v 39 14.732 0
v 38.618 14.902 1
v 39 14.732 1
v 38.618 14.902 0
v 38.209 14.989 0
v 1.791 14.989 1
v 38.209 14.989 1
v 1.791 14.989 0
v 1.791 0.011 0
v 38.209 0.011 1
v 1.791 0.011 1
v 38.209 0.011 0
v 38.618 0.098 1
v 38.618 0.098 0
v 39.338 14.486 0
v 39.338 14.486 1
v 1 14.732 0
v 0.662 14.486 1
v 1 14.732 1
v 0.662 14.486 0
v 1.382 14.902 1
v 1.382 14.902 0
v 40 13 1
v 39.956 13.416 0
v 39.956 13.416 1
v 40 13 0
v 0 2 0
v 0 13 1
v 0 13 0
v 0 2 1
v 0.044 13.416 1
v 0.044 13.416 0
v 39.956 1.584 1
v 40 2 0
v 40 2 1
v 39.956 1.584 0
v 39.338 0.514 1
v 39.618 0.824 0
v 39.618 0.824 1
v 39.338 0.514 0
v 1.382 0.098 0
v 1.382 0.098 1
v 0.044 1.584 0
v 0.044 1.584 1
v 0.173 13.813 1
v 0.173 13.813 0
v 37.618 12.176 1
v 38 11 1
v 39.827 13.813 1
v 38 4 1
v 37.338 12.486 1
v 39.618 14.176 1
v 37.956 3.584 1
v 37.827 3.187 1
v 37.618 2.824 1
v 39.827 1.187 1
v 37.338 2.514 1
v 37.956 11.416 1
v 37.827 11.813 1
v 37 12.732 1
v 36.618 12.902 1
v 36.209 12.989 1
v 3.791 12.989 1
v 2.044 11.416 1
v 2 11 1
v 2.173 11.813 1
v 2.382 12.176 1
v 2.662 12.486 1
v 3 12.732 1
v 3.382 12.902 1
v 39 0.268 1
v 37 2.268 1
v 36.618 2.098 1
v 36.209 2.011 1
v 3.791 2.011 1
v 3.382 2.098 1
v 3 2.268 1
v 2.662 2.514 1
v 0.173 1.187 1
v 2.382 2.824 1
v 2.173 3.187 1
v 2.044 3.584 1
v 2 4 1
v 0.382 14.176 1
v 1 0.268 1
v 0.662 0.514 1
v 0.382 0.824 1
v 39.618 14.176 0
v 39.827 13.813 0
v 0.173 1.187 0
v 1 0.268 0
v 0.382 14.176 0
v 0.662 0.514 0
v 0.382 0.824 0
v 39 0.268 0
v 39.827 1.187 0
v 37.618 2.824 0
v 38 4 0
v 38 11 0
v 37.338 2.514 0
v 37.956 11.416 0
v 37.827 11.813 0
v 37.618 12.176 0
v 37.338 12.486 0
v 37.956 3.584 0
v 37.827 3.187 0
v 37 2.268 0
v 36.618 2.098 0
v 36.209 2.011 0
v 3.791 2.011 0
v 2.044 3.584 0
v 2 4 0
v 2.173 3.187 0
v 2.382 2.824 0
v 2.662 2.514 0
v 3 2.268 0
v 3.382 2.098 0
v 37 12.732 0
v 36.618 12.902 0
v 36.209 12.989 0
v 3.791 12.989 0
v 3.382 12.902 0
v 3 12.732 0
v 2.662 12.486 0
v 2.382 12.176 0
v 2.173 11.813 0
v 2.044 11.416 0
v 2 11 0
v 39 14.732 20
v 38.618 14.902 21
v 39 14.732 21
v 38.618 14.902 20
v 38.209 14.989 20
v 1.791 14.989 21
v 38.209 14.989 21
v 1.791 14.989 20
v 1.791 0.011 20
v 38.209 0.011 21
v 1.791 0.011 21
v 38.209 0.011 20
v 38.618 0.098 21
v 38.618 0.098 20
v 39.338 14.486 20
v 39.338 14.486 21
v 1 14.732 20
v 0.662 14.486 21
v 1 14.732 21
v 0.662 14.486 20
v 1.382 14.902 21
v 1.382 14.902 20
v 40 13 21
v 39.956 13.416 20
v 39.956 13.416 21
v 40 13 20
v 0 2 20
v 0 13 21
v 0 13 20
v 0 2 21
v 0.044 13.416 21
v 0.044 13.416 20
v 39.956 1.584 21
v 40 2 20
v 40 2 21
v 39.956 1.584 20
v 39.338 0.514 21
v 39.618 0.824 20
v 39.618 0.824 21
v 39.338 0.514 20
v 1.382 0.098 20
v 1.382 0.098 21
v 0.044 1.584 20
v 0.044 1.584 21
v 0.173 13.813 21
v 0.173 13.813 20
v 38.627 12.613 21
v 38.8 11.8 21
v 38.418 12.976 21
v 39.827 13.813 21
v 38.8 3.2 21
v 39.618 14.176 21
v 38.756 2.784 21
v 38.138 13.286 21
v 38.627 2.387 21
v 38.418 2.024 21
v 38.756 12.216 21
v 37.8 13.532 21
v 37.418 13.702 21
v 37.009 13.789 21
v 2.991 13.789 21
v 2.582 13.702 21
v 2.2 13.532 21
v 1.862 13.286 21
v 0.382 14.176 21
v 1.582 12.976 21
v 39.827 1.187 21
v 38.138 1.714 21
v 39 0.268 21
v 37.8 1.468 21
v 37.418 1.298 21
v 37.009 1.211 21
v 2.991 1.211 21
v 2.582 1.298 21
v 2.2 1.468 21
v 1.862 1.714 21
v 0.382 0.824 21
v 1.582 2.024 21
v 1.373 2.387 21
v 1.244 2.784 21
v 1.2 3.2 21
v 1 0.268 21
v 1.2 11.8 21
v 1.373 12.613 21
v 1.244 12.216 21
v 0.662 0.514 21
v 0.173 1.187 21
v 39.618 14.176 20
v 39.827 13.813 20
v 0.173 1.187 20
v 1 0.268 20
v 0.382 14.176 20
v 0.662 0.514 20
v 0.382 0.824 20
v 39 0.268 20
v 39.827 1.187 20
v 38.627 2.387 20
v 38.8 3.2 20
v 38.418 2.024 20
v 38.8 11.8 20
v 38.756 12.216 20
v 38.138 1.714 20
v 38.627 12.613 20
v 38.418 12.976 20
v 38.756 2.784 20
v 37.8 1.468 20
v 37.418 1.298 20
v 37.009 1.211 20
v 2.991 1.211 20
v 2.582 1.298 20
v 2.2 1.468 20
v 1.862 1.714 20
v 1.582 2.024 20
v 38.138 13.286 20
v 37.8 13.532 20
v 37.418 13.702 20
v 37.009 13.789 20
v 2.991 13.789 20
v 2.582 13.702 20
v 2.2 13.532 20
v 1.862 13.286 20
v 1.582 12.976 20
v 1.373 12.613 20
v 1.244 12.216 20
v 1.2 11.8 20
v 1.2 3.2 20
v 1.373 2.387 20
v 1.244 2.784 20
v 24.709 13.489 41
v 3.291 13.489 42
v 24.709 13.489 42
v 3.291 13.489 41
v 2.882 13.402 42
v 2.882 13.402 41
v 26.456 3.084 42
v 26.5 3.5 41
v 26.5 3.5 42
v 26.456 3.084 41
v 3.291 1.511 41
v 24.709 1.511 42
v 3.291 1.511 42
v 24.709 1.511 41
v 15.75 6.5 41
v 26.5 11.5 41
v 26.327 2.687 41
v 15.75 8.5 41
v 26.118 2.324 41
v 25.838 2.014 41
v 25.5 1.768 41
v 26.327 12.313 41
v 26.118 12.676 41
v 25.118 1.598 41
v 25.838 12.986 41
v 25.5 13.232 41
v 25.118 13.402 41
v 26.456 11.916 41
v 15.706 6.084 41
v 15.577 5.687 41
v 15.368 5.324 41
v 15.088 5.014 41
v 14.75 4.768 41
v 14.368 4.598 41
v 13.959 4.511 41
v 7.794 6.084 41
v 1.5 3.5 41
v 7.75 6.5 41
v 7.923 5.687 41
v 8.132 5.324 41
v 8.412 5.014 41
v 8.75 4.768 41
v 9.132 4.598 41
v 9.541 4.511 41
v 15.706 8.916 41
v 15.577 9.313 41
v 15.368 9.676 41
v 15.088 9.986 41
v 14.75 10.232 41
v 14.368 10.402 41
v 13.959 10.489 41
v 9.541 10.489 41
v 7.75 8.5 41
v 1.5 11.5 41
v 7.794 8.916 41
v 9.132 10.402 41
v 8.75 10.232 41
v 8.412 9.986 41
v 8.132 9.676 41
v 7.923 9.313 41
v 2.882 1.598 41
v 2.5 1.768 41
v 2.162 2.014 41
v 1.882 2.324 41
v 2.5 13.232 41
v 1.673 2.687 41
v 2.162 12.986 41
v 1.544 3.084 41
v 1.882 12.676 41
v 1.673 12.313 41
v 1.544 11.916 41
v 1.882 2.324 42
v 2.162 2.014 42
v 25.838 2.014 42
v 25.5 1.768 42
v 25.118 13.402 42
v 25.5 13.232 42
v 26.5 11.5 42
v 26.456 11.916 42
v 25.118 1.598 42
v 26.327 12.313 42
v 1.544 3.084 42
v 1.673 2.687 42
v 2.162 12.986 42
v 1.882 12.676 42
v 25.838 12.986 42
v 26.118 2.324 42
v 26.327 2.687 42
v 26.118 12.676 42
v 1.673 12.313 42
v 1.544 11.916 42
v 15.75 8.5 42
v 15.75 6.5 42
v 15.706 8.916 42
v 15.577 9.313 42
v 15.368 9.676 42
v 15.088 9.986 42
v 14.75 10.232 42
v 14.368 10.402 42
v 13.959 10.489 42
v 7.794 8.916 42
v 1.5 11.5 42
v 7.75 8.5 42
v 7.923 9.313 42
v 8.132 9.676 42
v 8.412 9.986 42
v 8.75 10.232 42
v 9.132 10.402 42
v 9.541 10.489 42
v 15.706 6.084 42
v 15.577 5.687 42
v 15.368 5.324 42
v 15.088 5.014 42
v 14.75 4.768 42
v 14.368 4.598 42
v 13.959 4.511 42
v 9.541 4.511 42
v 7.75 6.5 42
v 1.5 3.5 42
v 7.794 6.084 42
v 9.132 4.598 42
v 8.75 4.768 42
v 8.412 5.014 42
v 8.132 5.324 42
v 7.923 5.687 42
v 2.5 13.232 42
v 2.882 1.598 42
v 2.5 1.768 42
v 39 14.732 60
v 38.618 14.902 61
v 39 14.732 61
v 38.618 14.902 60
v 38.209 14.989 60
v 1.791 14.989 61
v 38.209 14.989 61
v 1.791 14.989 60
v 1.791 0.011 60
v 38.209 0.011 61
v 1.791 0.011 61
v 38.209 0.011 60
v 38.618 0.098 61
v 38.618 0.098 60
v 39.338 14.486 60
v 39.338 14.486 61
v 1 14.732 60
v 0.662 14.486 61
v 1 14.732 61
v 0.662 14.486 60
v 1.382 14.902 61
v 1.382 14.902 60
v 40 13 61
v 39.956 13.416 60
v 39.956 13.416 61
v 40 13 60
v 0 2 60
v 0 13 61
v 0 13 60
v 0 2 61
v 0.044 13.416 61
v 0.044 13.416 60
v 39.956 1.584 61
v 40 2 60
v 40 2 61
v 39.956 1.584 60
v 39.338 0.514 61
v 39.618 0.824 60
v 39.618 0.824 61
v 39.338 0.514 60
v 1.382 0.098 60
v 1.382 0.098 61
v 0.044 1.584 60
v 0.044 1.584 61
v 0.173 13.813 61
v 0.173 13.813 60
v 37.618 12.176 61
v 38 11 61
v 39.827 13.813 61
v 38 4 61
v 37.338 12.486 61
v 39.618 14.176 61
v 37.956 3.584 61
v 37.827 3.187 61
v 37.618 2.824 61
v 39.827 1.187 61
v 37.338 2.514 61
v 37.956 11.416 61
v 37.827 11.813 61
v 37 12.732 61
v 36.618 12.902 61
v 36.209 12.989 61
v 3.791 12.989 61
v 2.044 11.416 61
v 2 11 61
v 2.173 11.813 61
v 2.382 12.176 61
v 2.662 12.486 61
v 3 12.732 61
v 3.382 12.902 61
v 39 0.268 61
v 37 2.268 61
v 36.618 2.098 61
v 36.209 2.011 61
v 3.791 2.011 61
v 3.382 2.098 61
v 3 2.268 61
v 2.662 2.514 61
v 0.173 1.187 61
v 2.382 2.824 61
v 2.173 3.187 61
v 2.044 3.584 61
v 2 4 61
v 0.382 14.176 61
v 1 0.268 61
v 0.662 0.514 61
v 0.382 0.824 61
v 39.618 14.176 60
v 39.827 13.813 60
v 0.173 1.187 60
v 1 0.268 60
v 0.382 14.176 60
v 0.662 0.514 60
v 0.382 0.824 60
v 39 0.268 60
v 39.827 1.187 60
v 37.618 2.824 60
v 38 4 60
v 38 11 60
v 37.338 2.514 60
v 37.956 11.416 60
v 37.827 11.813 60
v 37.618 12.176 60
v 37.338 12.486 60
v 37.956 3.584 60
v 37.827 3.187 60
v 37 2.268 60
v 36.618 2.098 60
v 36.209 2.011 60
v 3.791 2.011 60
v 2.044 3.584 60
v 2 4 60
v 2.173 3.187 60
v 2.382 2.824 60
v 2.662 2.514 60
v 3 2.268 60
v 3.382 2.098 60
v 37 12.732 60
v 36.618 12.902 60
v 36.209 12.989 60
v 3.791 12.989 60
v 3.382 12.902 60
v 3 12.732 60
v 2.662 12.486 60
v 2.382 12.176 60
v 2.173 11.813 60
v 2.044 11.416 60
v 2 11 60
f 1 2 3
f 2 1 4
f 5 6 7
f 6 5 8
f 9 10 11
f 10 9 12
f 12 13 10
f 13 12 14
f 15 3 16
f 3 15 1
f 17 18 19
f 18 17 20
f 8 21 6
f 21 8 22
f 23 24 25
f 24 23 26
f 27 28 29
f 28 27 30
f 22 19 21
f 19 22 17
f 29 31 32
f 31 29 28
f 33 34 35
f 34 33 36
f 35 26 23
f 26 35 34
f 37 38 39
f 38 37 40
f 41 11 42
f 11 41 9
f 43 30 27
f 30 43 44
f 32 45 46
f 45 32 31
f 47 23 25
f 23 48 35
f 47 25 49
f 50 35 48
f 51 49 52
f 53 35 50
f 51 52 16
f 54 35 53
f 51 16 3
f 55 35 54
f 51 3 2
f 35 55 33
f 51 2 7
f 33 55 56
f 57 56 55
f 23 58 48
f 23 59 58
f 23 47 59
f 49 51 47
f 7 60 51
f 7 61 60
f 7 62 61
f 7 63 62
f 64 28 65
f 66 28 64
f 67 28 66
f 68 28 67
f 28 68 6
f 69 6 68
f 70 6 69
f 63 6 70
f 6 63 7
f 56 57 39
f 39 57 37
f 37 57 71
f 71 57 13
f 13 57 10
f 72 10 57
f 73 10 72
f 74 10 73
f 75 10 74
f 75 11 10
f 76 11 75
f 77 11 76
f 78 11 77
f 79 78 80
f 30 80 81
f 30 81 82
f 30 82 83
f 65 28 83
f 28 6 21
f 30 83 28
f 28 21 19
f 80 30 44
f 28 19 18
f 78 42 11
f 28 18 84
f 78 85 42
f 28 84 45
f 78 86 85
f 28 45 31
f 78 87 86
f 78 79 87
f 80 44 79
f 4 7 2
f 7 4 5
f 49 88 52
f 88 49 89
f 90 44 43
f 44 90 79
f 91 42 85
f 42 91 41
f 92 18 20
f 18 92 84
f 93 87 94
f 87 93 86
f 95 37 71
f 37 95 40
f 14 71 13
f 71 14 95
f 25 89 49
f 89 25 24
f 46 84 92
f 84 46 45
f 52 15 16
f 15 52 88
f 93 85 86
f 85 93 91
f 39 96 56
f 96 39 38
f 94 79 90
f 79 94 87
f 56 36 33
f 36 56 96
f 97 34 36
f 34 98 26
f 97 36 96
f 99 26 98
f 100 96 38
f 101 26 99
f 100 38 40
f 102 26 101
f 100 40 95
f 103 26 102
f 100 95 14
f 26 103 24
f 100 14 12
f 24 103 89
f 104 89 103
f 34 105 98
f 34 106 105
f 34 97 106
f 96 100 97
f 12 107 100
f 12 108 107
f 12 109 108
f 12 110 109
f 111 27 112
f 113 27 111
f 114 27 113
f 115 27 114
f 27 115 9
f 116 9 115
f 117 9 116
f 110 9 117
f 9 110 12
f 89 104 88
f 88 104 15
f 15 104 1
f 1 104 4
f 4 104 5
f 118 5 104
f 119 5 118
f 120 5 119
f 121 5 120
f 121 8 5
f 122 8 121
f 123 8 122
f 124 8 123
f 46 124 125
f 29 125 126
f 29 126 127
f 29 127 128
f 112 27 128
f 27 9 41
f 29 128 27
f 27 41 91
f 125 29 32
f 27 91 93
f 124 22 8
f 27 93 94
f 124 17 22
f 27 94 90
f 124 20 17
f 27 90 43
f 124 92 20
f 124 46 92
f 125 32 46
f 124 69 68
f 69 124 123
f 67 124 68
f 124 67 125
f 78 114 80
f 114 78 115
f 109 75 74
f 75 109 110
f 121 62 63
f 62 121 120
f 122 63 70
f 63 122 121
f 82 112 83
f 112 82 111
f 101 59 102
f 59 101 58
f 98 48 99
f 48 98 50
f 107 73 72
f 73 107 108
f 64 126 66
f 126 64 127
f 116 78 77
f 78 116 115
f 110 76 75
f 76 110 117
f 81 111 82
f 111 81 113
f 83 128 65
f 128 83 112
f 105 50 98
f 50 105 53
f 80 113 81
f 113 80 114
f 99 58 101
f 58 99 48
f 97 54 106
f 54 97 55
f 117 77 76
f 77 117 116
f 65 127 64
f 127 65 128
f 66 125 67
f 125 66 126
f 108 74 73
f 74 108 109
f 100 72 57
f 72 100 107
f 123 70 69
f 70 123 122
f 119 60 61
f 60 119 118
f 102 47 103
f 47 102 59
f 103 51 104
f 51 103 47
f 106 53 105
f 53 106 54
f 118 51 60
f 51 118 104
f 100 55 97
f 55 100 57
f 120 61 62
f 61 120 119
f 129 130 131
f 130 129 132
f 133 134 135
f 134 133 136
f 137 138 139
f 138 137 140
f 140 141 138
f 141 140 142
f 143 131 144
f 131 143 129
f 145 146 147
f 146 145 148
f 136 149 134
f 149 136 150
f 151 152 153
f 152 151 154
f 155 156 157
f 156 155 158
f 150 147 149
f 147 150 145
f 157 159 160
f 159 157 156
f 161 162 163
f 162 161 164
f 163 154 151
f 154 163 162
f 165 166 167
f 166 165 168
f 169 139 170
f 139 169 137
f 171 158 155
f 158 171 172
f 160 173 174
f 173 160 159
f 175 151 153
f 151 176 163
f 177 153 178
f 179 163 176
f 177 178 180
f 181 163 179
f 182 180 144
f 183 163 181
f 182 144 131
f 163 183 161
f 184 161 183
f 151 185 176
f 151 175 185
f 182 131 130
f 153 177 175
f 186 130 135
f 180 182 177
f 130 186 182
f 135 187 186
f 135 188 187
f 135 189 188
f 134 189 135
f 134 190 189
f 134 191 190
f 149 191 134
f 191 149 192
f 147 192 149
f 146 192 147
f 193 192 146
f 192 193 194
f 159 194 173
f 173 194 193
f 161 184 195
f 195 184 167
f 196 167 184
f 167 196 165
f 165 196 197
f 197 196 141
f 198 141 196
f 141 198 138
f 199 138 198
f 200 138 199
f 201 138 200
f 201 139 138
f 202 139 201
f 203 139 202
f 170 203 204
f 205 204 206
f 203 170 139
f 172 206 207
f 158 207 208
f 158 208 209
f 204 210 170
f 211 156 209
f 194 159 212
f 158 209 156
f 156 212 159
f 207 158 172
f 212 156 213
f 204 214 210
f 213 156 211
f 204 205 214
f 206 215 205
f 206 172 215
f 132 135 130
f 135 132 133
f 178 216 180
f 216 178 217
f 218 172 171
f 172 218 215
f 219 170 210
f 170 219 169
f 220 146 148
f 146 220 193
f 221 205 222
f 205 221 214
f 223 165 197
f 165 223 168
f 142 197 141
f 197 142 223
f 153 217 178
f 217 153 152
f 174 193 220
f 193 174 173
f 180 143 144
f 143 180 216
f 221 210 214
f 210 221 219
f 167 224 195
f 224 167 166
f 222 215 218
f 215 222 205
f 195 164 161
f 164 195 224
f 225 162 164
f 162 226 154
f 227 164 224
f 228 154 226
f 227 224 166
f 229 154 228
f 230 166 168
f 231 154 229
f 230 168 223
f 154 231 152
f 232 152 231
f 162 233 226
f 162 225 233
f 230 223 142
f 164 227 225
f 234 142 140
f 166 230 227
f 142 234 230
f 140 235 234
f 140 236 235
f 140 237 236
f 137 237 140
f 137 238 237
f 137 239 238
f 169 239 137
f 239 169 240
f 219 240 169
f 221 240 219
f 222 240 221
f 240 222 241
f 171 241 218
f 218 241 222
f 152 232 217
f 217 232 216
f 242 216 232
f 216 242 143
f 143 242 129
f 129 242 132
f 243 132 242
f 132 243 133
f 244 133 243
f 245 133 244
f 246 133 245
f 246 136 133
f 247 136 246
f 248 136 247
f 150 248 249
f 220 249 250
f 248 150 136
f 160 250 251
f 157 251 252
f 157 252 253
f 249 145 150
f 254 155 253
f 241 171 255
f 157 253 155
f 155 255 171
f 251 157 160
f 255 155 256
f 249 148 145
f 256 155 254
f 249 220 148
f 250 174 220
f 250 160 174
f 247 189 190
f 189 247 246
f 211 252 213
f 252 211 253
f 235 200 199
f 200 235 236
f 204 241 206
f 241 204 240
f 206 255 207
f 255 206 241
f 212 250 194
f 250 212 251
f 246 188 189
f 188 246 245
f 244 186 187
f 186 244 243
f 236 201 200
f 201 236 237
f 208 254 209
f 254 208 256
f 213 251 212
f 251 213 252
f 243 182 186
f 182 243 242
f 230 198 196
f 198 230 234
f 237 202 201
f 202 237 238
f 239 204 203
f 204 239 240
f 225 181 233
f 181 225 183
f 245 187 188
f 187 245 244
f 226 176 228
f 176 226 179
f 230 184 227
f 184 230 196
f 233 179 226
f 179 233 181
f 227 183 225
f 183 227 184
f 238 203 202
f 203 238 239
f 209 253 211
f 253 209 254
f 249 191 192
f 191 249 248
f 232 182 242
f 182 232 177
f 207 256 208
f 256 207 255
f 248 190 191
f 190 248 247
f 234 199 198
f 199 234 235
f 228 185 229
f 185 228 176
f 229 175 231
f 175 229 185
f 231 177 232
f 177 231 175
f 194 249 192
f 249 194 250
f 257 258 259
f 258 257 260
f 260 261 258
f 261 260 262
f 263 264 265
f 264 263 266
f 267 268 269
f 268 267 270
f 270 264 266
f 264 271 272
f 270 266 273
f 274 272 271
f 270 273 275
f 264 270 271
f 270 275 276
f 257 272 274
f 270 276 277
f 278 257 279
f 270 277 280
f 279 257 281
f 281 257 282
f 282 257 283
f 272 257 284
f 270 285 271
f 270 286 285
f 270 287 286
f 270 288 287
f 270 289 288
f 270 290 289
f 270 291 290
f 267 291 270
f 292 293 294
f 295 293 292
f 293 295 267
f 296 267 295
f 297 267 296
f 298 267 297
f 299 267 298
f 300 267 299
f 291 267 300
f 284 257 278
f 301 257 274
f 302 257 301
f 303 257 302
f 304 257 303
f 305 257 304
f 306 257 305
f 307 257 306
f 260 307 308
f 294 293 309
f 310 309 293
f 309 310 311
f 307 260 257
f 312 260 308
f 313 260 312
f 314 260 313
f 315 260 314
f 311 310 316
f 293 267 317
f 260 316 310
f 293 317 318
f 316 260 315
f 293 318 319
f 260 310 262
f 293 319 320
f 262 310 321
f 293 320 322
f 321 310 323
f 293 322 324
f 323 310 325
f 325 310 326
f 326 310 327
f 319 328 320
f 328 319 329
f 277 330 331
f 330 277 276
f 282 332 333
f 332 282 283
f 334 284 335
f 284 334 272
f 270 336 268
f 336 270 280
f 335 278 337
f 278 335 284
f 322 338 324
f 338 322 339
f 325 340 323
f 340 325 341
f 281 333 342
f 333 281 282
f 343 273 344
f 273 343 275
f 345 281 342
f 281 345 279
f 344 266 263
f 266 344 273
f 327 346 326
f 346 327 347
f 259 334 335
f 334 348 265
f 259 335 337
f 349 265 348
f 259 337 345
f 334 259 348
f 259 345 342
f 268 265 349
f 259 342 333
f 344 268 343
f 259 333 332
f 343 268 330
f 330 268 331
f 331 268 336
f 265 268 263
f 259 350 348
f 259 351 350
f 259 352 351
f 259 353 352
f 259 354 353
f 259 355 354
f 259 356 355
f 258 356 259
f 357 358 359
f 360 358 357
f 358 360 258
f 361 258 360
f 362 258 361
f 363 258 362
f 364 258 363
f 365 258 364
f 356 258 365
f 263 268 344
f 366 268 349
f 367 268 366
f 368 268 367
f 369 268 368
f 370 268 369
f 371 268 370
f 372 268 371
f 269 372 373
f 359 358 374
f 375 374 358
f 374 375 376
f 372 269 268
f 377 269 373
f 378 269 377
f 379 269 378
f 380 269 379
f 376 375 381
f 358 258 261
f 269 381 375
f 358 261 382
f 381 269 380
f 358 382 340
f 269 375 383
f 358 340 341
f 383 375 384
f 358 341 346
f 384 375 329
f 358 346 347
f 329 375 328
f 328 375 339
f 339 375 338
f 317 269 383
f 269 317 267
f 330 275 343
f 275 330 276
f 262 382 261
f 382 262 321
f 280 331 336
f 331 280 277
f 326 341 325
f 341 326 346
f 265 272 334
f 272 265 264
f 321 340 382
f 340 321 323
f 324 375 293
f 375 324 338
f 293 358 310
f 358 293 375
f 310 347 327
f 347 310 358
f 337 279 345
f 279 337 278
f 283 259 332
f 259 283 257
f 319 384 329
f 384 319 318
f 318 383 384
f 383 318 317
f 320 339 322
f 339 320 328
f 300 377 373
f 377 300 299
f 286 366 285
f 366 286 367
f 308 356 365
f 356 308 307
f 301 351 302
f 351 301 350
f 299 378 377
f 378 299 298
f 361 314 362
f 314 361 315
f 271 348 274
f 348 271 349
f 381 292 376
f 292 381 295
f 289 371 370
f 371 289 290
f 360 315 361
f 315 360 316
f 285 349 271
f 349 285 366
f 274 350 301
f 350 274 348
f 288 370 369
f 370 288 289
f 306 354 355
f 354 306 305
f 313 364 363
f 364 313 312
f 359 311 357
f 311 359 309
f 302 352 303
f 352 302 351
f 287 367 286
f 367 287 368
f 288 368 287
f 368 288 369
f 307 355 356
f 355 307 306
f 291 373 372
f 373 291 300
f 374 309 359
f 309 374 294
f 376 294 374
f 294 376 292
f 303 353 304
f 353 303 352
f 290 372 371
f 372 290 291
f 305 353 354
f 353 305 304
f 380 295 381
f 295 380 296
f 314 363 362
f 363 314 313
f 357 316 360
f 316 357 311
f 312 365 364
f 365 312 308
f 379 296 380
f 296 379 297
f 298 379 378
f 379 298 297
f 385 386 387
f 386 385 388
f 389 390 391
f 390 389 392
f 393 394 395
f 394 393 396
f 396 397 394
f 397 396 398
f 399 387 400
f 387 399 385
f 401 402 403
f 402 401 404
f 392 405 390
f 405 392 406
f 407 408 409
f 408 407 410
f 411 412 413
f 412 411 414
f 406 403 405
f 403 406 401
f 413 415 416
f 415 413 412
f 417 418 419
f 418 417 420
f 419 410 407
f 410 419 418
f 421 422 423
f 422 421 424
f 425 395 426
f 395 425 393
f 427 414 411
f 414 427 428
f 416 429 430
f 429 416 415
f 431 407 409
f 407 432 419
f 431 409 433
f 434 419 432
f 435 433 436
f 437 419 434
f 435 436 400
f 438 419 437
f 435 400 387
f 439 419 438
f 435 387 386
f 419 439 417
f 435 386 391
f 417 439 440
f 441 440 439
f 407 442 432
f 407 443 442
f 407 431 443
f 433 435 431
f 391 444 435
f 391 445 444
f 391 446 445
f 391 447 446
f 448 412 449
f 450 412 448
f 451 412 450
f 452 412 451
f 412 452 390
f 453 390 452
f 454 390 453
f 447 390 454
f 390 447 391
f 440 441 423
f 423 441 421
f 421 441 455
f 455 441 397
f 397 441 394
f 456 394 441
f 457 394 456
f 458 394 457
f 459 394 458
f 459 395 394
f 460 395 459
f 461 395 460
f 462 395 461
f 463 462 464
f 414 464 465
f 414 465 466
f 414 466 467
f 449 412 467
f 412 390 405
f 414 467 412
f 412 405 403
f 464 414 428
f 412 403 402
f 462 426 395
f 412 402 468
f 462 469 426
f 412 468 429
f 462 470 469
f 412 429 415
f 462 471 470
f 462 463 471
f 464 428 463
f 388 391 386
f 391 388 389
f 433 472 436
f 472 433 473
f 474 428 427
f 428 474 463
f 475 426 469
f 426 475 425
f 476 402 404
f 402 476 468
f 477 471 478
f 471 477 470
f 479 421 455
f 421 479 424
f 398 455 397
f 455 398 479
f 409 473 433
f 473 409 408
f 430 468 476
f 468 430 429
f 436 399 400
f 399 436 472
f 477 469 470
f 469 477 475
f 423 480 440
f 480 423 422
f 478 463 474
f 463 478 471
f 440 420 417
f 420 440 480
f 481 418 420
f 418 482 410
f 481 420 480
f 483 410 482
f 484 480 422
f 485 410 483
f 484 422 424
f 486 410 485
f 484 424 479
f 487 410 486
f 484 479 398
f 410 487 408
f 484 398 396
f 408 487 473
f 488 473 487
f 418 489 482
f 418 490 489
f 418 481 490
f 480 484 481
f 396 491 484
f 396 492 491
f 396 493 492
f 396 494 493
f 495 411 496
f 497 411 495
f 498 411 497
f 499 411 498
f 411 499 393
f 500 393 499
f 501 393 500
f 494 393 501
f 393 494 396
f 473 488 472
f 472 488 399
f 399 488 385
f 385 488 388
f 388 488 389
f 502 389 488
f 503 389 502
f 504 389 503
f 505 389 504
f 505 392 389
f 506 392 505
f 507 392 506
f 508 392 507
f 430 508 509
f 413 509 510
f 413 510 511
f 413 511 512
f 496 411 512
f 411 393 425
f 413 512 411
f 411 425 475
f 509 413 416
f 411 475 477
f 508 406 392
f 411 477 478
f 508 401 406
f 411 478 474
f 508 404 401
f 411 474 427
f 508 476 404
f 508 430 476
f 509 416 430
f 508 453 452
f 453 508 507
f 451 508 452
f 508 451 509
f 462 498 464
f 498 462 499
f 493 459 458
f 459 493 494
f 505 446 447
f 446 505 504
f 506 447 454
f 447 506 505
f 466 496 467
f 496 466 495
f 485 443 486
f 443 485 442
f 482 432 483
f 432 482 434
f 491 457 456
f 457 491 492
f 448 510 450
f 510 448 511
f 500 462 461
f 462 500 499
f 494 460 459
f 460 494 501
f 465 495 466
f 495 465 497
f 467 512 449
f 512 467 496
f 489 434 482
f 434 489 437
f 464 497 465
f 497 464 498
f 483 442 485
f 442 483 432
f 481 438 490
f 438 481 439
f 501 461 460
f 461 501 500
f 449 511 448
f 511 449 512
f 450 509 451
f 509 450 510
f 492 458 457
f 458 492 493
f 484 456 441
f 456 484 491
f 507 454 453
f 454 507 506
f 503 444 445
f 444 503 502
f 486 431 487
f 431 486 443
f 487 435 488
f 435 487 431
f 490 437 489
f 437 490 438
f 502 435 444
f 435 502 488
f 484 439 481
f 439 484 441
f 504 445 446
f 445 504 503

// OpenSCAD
// Laptop Camera Cover with Rounded Sides - Sliding Design
// Customizable parameters
// Design parameters
cover_width = 40;      // Width of the cover
cover_height = 15;     // Height of the cover
base_thickness = 1;    // Thickness of the base plate
mid_thickness = 1;     // Thickness of the middle plate
slider_thickness = mid_thickness;  // Thickness of the sliding part
corner_radius = 2;     // Radius for rounded corners
window_width = 8;      // Width of the camera window
window_height = 6;     // Height of the camera window
wall_thickness = 1.2;  // Thickness of walls
slide_clearance = 0.3; // Clearance for sliding mechanism
slider_width = 25;     // Width of the sliding part
margin = 2;           // Margin from edges for hollowing

// View parameters
exploded_view = true;  // Set to true for exploded view
explode_distance = 20; // Distance between parts in exploded view

// Base plate module
module base_plate() {
    difference() {
        // Outer shell
        hull() {
            for (x = [corner_radius, cover_width - corner_radius]) {
                for (y = [corner_radius, cover_height - corner_radius]) {
                    translate([x, y, 0])
                        cylinder(r=corner_radius, h=base_thickness, $fn=30);
                }
            }
        }
        
        // Center cutout
        translate([margin, margin, -0.1])
            hull() {
                for (x = [corner_radius, cover_width - margin*2 - corner_radius]) {
                    for (y = [corner_radius, cover_height - margin*2 - corner_radius]) {
                        translate([x, y, 0])
                            cylinder(r=corner_radius, h=base_thickness + 0.2, $fn=30);
                    }
                }
            }
    }
}

// Middle plate module
module middle_plate() {
    difference() {
        // Outer shell
        hull() {
            for (x = [corner_radius, cover_width - corner_radius]) {
                for (y = [corner_radius, cover_height - corner_radius]) {
                    translate([x, y, 0])
                        cylinder(r=corner_radius, h=mid_thickness, $fn=30);
                }
            }
        }
            
        // Sliding channel
        translate([wall_thickness, wall_thickness, -0.1])
            hull() {
                for (x = [corner_radius, cover_width - wall_thickness*2 - corner_radius]) {
                    for (y = [corner_radius, cover_height - wall_thickness*2 - corner_radius]) {
                        translate([x, y, 0])
                            cylinder(r=corner_radius, h=mid_thickness + 0.2, $fn=30);
                    }
                }
            }
    }
}

// Sliding part module
module slider() {
    total_width = slider_width;
    total_height = cover_height - (wall_thickness * 2) - slide_clearance*2;
    
    translate([wall_thickness + slide_clearance, wall_thickness + slide_clearance, slider_thickness]) {
        difference() {
            // Slider body
            hull() {
                for (x = [corner_radius, total_width - corner_radius]) {
                    for (y = [corner_radius, total_height - corner_radius]) {
                        translate([x, y, 0])
                            cylinder(r=corner_radius, h=slider_thickness, $fn=30);
                    }
                }
            }
            
            // Camera window cutout
            translate([total_width/4, (total_height-window_height)/2, -0.1]) {
                hull() {
                    for (x = [corner_radius, window_width - corner_radius]) {
                        for (y = [corner_radius, window_height - corner_radius]) {
                            translate([x, y, 0])
                                cylinder(r=corner_radius, h=slider_thickness + 0.2, $fn=30);
                        }
                    }
                }
            }
        }
    }
}

// Assembly module
module assembly(exploded = false) {
    if (exploded) {
        // Exploded view - stack parts vertically
        base_plate();
        translate([0, 0, explode_distance]) middle_plate();
        translate([0, 0, explode_distance * 2]) slider();
        translate([0, 0, explode_distance * 3]) base_plate();
    } else {
        // Normal assembly
        base_plate();
        translate([0, 0, base_thickness]) middle_plate();
        translate([0, 0, base_thickness]) slider();
        translate([0, 0, base_thickness + mid_thickness]) base_plate();
    }
}

// Final assembly - use exploded_view parameter
assembly(exploded_view);
